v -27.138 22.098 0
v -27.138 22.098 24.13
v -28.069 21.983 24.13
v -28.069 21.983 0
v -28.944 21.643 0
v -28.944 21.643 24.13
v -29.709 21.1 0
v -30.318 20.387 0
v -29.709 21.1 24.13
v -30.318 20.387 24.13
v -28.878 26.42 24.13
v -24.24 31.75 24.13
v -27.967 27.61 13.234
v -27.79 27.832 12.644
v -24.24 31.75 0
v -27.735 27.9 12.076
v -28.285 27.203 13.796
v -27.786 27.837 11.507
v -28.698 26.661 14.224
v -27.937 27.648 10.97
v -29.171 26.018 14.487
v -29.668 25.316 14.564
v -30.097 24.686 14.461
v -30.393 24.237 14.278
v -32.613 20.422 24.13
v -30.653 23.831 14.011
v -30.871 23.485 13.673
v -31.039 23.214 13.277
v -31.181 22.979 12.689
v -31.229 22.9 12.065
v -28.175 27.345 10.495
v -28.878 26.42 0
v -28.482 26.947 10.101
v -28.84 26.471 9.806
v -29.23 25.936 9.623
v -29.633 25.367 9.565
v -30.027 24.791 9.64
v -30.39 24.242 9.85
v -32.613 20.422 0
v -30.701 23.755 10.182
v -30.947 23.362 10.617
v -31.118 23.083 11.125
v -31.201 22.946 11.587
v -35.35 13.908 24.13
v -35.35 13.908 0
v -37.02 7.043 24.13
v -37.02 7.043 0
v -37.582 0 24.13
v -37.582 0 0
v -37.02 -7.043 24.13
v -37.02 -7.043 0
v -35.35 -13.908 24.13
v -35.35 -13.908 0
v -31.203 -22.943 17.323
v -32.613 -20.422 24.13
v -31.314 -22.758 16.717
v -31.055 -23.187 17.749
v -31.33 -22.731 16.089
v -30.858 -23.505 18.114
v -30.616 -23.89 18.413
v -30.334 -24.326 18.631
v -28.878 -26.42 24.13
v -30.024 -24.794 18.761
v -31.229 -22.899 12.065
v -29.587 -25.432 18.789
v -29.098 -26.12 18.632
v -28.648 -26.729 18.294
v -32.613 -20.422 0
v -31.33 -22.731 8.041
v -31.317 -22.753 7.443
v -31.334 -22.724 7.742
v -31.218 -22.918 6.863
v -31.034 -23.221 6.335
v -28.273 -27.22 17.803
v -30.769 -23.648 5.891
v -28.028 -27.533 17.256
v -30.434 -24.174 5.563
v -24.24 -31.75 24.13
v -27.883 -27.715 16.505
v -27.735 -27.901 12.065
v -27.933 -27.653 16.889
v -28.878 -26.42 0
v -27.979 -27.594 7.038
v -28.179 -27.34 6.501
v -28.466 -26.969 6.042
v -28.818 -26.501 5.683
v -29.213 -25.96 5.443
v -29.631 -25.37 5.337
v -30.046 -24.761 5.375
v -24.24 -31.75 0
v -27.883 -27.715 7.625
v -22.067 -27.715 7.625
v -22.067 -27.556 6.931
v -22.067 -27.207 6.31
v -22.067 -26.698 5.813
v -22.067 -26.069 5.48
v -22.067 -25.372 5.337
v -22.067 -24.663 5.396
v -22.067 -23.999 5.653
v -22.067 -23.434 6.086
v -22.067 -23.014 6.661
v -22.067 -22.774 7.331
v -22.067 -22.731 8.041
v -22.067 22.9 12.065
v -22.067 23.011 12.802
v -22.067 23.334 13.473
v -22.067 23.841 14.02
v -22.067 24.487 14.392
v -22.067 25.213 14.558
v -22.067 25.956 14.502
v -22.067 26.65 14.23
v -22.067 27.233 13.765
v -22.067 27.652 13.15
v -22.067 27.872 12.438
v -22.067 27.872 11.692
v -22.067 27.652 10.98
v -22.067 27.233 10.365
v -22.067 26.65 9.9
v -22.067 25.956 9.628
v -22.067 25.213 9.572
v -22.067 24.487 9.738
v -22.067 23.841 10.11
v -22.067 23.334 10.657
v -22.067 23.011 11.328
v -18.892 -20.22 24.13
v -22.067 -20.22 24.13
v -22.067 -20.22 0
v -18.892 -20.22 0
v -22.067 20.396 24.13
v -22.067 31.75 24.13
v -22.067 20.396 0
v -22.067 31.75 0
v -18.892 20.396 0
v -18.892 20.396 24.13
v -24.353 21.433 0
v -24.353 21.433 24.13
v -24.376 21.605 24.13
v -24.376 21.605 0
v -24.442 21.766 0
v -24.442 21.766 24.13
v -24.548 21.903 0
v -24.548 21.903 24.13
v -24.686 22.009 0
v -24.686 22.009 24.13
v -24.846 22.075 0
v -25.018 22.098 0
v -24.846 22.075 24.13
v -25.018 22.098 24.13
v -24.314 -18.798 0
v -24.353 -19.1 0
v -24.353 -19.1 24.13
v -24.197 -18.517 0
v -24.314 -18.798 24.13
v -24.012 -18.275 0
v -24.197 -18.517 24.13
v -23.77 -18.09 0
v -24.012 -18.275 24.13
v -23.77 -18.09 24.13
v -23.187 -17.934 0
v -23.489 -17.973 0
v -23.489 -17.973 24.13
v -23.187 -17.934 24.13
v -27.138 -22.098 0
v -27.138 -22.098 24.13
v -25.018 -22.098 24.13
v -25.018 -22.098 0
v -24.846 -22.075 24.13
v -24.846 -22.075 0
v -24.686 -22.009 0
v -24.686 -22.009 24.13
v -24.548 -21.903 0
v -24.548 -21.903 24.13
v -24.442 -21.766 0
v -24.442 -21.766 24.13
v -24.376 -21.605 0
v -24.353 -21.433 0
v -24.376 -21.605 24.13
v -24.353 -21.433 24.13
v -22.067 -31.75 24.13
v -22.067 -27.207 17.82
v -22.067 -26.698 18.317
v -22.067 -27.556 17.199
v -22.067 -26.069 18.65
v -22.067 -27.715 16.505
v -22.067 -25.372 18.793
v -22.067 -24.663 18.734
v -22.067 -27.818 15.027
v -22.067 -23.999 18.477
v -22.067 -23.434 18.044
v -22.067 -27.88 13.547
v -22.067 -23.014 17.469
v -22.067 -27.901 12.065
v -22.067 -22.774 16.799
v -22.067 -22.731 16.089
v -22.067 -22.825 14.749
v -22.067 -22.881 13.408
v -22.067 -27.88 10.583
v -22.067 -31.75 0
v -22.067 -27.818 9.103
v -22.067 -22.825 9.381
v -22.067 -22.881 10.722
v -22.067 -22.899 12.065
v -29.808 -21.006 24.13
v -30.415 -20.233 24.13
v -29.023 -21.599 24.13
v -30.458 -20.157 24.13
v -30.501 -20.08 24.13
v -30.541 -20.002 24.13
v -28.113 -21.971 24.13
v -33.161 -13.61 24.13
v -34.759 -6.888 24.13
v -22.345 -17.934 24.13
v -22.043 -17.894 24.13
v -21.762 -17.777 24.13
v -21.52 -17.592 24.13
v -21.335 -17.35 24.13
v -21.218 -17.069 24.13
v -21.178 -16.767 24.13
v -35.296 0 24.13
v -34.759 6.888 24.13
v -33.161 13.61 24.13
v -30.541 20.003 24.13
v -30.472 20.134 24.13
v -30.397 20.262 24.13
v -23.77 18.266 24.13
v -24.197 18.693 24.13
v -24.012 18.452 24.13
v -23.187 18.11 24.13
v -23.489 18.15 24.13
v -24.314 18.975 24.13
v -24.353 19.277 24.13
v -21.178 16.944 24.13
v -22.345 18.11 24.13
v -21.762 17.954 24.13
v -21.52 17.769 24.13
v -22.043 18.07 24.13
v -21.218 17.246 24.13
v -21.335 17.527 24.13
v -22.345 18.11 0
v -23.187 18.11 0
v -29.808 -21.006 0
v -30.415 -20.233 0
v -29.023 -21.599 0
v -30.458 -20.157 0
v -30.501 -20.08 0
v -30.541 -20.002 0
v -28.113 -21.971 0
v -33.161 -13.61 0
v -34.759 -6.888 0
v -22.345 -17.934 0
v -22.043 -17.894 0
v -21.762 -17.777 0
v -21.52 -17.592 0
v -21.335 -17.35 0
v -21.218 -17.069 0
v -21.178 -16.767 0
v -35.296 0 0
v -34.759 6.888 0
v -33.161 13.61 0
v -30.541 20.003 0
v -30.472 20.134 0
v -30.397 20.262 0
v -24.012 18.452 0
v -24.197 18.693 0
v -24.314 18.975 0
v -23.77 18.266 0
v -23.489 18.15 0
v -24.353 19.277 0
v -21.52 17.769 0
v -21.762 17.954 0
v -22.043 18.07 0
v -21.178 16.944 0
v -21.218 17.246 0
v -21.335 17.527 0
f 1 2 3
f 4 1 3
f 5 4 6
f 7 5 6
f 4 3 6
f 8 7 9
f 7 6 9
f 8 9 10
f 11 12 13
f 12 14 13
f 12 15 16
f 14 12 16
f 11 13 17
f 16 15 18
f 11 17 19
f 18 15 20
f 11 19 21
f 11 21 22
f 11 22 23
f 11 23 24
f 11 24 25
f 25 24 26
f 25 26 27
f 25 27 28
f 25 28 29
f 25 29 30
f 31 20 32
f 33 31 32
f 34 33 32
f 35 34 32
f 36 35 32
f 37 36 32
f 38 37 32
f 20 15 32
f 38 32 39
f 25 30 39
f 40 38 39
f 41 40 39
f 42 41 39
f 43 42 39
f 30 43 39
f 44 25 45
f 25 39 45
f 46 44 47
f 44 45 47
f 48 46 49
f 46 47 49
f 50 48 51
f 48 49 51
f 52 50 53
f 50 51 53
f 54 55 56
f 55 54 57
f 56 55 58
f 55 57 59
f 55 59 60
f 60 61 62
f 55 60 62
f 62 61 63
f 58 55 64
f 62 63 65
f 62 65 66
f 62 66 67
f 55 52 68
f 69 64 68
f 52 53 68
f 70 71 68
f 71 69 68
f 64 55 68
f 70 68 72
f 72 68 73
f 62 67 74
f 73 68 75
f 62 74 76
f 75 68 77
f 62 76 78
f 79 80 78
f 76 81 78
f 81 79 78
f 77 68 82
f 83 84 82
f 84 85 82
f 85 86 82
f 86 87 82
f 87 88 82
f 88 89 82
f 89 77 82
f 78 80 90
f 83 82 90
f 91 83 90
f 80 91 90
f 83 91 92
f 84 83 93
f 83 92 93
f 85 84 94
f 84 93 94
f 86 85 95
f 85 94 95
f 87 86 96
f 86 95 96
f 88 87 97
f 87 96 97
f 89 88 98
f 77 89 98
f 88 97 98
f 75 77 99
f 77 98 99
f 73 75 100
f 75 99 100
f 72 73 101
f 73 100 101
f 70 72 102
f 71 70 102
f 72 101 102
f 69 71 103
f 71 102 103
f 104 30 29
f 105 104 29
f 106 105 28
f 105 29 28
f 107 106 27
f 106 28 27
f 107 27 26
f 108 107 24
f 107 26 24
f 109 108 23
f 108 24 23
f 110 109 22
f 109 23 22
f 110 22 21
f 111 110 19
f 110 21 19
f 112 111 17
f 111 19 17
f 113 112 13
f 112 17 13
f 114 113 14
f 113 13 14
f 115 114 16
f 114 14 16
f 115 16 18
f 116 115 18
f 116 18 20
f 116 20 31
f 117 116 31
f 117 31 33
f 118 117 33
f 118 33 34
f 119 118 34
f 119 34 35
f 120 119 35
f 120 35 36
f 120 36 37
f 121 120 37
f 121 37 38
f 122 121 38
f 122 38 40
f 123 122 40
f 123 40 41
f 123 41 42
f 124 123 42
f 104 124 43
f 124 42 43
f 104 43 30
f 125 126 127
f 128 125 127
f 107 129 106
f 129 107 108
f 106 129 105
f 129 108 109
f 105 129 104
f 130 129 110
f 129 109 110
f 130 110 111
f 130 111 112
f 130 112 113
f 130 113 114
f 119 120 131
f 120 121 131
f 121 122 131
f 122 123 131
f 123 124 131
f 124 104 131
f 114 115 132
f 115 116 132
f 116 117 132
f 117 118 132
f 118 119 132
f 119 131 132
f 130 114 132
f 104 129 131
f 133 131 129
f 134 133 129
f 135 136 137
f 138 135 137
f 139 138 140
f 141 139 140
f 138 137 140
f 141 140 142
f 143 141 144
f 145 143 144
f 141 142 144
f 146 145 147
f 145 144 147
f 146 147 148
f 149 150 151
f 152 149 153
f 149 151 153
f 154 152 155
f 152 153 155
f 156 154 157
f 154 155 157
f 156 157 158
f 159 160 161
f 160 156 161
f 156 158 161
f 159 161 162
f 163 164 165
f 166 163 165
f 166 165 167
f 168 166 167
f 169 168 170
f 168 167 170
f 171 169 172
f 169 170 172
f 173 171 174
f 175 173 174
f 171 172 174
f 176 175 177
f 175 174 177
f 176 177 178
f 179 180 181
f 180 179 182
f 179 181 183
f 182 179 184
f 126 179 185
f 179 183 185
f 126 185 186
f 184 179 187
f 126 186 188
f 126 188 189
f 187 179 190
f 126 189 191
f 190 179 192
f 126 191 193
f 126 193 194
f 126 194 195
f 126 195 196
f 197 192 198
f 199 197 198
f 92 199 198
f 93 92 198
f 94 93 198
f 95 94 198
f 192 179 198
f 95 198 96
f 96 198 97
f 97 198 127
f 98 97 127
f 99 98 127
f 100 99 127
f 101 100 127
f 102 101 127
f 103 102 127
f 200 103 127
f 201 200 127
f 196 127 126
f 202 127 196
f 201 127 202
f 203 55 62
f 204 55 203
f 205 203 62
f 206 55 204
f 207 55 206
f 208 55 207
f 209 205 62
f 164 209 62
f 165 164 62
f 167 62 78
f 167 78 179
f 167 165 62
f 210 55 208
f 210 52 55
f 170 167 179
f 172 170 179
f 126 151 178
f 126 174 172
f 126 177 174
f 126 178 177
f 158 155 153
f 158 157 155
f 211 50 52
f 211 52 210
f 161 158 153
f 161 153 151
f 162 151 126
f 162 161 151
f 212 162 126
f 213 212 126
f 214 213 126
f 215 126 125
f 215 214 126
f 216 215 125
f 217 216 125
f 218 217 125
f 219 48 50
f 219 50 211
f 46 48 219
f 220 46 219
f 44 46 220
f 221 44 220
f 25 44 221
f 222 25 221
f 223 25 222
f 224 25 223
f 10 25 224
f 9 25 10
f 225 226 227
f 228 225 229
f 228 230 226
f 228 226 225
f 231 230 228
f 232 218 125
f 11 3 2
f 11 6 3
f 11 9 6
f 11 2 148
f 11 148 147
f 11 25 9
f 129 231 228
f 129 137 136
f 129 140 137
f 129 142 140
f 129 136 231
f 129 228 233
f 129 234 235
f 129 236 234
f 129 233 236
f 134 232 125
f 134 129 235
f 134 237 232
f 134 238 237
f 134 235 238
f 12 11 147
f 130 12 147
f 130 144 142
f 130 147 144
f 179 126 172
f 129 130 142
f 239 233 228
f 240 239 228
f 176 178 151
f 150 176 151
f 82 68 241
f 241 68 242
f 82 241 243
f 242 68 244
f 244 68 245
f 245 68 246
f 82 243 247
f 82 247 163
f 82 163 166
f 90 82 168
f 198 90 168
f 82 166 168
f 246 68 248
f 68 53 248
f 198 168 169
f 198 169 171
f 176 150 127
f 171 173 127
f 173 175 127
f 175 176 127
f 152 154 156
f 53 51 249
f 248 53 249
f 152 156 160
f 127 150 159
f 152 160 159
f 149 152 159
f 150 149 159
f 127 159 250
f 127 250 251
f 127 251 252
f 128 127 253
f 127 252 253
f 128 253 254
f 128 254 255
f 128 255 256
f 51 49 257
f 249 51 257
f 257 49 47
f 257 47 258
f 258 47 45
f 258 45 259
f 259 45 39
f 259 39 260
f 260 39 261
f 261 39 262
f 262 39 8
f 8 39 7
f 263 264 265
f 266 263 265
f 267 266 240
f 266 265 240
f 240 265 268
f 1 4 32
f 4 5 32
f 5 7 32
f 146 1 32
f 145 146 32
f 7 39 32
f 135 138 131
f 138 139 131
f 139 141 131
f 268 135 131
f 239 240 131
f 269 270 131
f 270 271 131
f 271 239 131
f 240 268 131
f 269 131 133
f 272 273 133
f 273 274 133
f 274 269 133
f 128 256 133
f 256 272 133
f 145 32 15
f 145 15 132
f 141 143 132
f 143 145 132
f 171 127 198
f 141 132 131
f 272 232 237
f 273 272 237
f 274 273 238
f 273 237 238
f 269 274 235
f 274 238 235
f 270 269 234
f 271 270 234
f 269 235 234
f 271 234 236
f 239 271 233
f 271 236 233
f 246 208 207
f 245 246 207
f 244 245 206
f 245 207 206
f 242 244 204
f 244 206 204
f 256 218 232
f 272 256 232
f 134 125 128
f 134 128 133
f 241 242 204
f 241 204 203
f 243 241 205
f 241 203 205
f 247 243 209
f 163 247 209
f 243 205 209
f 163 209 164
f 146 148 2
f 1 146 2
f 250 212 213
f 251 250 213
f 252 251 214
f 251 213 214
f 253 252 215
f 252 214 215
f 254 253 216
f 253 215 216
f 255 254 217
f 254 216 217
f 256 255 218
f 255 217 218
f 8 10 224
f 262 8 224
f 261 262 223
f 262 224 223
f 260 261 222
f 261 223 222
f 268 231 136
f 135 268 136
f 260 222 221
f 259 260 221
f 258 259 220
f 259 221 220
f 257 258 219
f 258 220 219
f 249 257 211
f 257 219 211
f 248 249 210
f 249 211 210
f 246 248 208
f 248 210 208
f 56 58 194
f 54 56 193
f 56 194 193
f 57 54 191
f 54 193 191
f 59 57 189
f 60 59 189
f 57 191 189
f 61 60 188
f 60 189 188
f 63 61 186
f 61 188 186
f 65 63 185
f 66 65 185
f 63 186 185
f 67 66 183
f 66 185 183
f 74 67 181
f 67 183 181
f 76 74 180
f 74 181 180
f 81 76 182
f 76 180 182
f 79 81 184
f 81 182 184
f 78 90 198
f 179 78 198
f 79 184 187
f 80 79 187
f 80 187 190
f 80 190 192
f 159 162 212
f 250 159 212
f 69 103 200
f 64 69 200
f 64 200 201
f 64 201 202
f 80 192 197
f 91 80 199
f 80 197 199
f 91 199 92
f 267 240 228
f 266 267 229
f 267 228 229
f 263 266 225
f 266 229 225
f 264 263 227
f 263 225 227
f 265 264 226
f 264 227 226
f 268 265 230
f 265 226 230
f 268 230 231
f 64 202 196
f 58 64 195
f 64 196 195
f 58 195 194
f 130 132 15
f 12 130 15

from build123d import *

# Parameters (mm, degrees)
F1_DEPTH = 24.13
F3_DEPTH = 25.4
F4_D     = 5
F4_DEPTH = 15.6972
F4_TIP   = 1.5021515476
F6_DEPTH = 3.175
F9_DEPTH = 25.4


# Not quite as in the source:
# - a feature names something its author has since deleted; it is built from what else it names


with BuildPart() as f1:
    # F0 (on Top) → F1 (new body)
    with BuildSketch(Plane.XY):
        with BuildLine():
            Line((-22.0673531294, -31.75), (-22.0673531294, 31.75))
            Line((-22.0673531294, 31.75), (-24.2402065279, 31.75))
            ThreePointArc((-24.2402065279, 31.75), (-37.5816867945, 0), (-24.2402065279, -31.75))
            Line((-24.2402065279, -31.75), (-22.0673531294, -31.75))
        make_face()
    extrude(amount=F1_DEPTH)

    # F2 (on face) → F3 (cut)
    with BuildSketch(Plane.YZ.offset(-22.0673531294)):
        with BuildLine():
            ThreePointArc((-27.7153407028, 16.5054662391), (-27.8542875294, 14.287165191), (-27.90063, 12.065))
            Line((-27.90063, 12.065), (-22.89937, 12.065))
            ThreePointArc((-22.89937, 12.065), (-22.8573758972, 14.078656851), (-22.7314666127, 16.0888121361))
            ThreePointArc((-22.7314666127, 16.0888121361), (-25.0150766063, 18.7890762326), (-27.7153407028, 16.5054662391))
        make_face()
        with BuildLine():
            Line((-22.89937, 12.065), (-27.90063, 12.065))
            ThreePointArc((-27.90063, 12.065), (-27.8542875294, 9.842834809), (-27.7153407028, 7.6245337609))
            ThreePointArc((-27.7153407028, 7.6245337609), (-25.0150766063, 5.3409237674), (-22.7314666127, 8.0411878639))
            ThreePointArc((-22.7314666127, 8.0411878639), (-22.8573758972, 10.051343149), (-22.89937, 12.065))
        make_face()
    extrude(amount=-F3_DEPTH, mode=Mode.SUBTRACT)

    # F4
    with Locations(Plane.YZ.offset(-22.0673531294)):
        with Locations((25.4, 12.065)):
            Hole(F4_D / 2, depth=F4_DEPTH)
            with Locations((0, 0, -(F4_DEPTH + F4_TIP / 2))):  # 118° drill point
                Cone(0, F4_D / 2, F4_TIP, mode=Mode.SUBTRACT)

    # F5 (on face) → F6 (join)
    with BuildSketch(Plane.YZ.offset(-22.0673531294)):
        Polygon((18.8468, 24.13), (-20.2196036578, 24.13), (-20.2196036578, 12.065), (20.3962, 12.065), (20.3962, 24.13), align=None)
        Polygon((20.3962, 12.065), (-20.2196036578, 12.065), (-20.2196036578, 0), (18.8468, 0), (20.3962, 0), align=None)
    extrude(amount=F6_DEPTH)

    # F8 (on offset) → F9 (cut)
    with BuildSketch(Plane.XY.offset(24.13)):
        with BuildLine():
            Line((-27.1383672688, -22.098), (-25.0180043274, -22.098))
            ThreePointArc((-25.0180043274, -22.098), (-24.5480249582, -21.9033281712), (-24.3533531294, -21.433348802))
            Line((-24.3533531294, -21.433348802), (-24.3533531294, -19.1001488633))
            ThreePointArc((-24.3533531294, -19.1001488633), (-24.0116799492, -18.2752768379), (-23.1868079238, -17.9336036578))
            Line((-23.1868079238, -17.9336036578), (-22.344898335, -17.9336036578))
            ThreePointArc((-22.344898335, -17.9336036578), (-21.5200263095, -17.5919304776), (-21.1783531294, -16.7670584522))
            Line((-21.1783531294, -16.7670584522), (-21.1783531294, 16.9436547944))
            ThreePointArc((-21.1783531294, 16.9436547944), (-21.5200263095, 17.7685268198), (-22.344898335, 18.1102))
            Line((-22.344898335, 18.1102), (-23.1868079238, 18.1102))
            ThreePointArc((-23.1868079238, 18.1102), (-24.0116799492, 18.4518731802), (-24.3533531294, 19.2767452056))
            Line((-24.3533531294, 19.2767452056), (-24.3533531294, 21.4333486842))
            ThreePointArc((-24.3533531294, 21.4333486842), (-24.5480249927, 21.9033281367), (-25.0180044452, 22.098))
            Line((-25.0180044452, 22.098), (-27.1383672685, 22.098))
            ThreePointArc((-27.1383672685, 22.098), (-28.9437022551, 21.6431252713), (-30.3179604636, 20.3871157933))
            ThreePointArc((-30.3179604636, 20.3871157933), (-30.4349971545, 20.1980605736), (-30.540806063, 20.0025))
            ThreePointArc((-30.540806063, 20.0025), (-35.2956867945, 0), (-30.5408060633, -20.0025))
            ThreePointArc((-30.5408060633, -20.0025), (-30.4797145494, -20.1187097942), (-30.414655411, -20.2327457441))
            ThreePointArc((-30.414655411, -20.2327457441), (-29.0233896447, -21.5990105168), (-27.1383672688, -22.098))
        make_face()
    extrude(amount=-F9_DEPTH, mode=Mode.SUBTRACT)


solid = f1.part
